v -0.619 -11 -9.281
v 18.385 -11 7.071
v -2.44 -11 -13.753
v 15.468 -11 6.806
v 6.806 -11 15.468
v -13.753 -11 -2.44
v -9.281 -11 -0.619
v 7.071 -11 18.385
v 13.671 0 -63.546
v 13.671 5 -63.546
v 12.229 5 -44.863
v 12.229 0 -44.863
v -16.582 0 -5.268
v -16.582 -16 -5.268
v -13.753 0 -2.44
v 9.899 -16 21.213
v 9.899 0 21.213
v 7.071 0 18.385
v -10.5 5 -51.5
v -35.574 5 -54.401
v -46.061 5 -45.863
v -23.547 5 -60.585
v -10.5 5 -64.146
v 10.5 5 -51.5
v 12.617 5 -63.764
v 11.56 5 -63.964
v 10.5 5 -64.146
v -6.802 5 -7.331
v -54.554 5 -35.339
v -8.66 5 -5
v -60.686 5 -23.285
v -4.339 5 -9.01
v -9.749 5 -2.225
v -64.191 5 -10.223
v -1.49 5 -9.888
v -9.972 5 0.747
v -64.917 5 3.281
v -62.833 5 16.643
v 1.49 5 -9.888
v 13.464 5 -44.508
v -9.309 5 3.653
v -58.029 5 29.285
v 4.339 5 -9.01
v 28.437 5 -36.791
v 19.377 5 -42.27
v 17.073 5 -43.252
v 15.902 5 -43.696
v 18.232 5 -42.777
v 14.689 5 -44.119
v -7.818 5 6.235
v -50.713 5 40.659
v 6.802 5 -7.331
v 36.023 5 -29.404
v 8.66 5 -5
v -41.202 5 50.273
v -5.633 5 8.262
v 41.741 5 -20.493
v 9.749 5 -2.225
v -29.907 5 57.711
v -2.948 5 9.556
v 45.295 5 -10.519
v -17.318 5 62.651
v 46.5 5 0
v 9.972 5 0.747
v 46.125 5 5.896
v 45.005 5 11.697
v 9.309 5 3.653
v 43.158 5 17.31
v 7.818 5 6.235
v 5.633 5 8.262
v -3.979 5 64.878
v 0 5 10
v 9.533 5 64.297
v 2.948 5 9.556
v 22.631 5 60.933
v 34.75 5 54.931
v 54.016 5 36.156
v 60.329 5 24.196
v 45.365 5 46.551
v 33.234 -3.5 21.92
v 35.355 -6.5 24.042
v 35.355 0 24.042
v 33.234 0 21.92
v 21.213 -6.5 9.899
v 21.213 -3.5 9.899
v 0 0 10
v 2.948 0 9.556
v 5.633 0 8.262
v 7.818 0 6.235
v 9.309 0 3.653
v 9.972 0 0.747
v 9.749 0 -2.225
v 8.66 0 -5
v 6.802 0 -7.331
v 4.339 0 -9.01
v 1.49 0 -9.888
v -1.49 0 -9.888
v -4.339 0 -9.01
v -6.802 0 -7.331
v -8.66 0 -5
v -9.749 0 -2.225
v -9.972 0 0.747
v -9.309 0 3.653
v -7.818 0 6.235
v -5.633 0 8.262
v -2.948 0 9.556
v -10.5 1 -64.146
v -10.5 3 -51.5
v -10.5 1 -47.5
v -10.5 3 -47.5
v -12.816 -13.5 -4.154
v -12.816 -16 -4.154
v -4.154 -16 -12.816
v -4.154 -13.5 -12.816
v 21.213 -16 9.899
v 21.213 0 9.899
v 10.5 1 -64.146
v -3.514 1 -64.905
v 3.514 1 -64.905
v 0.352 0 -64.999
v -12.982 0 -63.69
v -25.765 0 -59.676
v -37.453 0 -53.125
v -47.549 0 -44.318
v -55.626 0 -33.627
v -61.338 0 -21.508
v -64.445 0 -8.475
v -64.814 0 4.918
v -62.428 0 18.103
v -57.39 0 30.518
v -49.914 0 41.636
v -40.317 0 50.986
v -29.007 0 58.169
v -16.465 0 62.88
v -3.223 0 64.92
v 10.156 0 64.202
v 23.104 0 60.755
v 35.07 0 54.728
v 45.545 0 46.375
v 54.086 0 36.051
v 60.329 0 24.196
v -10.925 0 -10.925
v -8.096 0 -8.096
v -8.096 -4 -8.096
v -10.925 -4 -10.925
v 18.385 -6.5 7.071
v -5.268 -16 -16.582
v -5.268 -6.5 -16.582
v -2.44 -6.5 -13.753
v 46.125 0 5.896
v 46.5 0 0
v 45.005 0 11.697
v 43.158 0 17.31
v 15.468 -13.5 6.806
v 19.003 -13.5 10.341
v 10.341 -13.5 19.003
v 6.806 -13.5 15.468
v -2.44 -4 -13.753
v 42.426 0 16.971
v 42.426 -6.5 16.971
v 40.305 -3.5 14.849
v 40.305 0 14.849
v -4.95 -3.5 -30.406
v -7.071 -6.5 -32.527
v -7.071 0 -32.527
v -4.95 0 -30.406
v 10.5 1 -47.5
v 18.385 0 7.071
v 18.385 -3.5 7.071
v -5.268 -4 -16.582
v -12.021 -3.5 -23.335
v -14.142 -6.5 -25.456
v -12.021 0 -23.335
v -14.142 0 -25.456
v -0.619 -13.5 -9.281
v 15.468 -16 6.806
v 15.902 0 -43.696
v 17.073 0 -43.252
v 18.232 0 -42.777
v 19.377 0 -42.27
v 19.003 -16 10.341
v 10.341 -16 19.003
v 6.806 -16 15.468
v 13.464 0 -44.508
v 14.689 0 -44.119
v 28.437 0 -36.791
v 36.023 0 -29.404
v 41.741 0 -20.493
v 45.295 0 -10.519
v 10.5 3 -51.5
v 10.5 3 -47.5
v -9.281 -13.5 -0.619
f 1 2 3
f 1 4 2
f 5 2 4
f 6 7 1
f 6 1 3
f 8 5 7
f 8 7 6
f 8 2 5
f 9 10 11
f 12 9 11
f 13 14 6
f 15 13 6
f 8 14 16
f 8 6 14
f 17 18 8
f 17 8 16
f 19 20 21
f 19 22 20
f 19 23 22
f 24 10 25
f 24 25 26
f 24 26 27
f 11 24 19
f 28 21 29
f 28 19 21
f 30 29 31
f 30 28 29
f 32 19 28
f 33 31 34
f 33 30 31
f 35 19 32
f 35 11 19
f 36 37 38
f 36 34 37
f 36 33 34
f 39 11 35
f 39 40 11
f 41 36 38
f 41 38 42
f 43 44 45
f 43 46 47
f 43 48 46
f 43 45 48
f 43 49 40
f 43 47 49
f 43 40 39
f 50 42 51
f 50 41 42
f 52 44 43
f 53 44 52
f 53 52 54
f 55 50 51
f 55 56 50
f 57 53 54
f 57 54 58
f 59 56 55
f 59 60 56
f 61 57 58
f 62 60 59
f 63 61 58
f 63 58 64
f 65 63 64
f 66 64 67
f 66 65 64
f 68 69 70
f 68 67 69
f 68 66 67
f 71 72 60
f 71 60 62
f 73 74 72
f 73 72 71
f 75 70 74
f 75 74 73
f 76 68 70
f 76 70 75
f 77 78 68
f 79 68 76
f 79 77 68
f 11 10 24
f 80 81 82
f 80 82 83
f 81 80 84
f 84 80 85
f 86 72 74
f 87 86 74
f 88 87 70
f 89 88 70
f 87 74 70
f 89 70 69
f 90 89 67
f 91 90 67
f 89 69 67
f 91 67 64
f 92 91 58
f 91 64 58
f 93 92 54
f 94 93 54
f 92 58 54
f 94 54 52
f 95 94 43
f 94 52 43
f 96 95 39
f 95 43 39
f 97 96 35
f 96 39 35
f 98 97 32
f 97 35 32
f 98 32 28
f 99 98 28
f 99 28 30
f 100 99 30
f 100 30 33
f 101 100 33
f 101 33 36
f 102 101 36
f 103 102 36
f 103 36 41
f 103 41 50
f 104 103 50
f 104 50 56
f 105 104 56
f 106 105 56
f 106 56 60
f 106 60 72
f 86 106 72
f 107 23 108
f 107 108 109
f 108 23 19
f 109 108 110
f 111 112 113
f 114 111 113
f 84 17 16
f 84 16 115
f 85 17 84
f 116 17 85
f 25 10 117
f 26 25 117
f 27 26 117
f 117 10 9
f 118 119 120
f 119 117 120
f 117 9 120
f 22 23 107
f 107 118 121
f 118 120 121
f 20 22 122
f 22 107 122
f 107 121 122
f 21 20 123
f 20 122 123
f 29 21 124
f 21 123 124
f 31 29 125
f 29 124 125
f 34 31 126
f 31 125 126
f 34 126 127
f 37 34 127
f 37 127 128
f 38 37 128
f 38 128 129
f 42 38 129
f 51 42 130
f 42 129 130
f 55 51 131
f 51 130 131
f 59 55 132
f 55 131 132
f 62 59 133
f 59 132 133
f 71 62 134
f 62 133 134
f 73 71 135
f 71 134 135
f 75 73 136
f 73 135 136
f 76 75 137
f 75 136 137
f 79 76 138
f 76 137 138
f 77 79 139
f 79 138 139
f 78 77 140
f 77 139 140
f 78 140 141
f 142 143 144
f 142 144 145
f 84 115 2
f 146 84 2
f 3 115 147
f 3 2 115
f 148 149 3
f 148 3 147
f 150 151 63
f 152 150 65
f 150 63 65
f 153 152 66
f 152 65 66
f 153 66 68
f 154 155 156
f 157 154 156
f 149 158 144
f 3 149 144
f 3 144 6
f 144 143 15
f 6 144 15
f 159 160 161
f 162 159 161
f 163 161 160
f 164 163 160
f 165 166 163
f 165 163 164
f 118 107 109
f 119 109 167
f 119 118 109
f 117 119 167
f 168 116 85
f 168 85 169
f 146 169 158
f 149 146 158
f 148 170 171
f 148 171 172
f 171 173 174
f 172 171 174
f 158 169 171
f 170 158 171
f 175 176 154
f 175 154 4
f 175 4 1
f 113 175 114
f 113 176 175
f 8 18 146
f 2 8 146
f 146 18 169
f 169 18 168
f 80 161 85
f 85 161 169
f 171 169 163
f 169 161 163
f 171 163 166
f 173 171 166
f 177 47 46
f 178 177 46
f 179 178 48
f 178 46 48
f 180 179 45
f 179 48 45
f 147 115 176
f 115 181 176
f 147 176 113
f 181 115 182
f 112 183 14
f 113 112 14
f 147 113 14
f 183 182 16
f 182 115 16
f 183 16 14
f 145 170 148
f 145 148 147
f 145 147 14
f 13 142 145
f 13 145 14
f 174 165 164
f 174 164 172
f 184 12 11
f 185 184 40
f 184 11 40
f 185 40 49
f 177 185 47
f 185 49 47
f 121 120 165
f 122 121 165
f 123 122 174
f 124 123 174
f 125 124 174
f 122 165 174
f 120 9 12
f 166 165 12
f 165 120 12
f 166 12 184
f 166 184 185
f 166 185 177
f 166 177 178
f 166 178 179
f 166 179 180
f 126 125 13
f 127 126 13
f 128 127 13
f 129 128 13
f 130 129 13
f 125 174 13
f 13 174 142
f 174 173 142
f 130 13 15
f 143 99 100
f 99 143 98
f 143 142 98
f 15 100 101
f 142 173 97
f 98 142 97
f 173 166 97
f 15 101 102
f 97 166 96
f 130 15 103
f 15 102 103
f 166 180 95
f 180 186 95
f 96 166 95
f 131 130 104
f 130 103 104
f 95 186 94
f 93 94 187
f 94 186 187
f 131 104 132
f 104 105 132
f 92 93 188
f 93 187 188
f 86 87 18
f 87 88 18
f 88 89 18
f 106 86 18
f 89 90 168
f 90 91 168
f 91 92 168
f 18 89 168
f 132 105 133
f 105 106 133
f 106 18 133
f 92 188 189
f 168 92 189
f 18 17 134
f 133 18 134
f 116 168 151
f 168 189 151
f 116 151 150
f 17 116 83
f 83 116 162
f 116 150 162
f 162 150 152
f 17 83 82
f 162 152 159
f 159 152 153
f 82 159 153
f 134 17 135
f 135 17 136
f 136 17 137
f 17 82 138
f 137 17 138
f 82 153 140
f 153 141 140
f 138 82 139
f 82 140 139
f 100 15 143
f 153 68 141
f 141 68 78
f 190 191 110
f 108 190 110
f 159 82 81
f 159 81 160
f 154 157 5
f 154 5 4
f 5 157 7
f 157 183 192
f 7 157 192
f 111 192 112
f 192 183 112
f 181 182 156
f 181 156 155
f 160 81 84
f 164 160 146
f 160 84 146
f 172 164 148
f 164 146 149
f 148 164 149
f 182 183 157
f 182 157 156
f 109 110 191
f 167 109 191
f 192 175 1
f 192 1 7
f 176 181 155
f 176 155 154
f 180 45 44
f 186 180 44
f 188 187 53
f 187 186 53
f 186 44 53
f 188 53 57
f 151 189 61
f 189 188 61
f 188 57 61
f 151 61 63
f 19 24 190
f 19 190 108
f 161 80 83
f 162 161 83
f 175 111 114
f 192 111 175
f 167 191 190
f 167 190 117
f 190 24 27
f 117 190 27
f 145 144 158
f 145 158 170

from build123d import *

# Parameters (mm, degrees)
SKETCH1_R           = 65
BOSS_EXTRUDE1_DEPTH = 5
SKETCH2_R           = 10
CUT_EXTRUDE1_DEPTH  = 5
CUT_EXTRUDE3_DEPTH  = 4
CUT_EXTRUDE2_DEPTH  = 93.059763198
BOSS_EXTRUDE2_DEPTH = 11
BOSS_EXTRUDE3_DEPTH = 5
CUT_EXTRUDE4_DEPTH  = 5
CUT_EXTRUDE5_DEPTH  = 2.5
SKETCH16_W          = 21
SKETCH16_H          = 2
BOSS_EXTRUDE5_DEPTH = 4
SKETCH17_W          = 4
SKETCH17_H          = 4
CUT_EXTRUDE8_DEPTH  = 8
BOSS_EXTRUDE6_DEPTH = 6.5
SKETCH23_W          = 64
SKETCH23_H          = 3.5
CUT_EXTRUDE9_DEPTH  = 10


with BuildPart() as part:
    # Sketch1 → Boss-Extrude1 (new body)
    with BuildSketch(Plane(origin=(0, 0, 0), x_dir=(1, 0, 0), z_dir=(0, 1, 0))):
        with Locations(Location((0, 0, 0), (0, 0, 270))):
            Circle(SKETCH1_R)
    extrude(amount=BOSS_EXTRUDE1_DEPTH)

    # Sketch2 → Cut-Extrude1 (cut)
    with BuildSketch(Plane(origin=(0, 5, 0), x_dir=(1, 0, 0), z_dir=(0, 1, 0))):
        with Locations(Location((0, 0, 0), (0, 0, 270))):
            Circle(SKETCH2_R)
    extrude(amount=-CUT_EXTRUDE1_DEPTH, mode=Mode.SUBTRACT)

    # Sketch5 → Cut-Extrude3 (cut)
    with BuildSketch(Plane(origin=(0, 5, 0), x_dir=(1, 0, 0), z_dir=(0, 1, 0))):
        Polygon((0, 47.5), (10.5, 47.5), (10.5, 65), (-10.5, 65), (-10.5, 47.5), align=None)
    extrude(amount=-CUT_EXTRUDE3_DEPTH, mode=Mode.SUBTRACT)

    # Sketch3 → Cut-Extrude2 (cut, through all)
    with BuildSketch(Plane(origin=(0, 5, 0), x_dir=(1, 0, 0), z_dir=(0, 1, 0))):
        with BuildLine():
            Line((43.158190089, -17.309553092), (60.328652813, -24.196149483))
            ThreePointArc((60.328652813, -24.196149483), (63.821479272, -12.321476518), (65, 0))
            ThreePointArc((65, 0), (54.706549574, 35.102612918), (27.086355887, 59.087471809))
            ThreePointArc((27.086355887, 59.087471809), (24.677873317, 60.133206871), (22.229121422, 61.080816635))
            ThreePointArc((22.229121422, 61.080816635), (17.992417486, 62.460170613), (13.671171428, 63.546038994))
            Line((13.671171428, 63.546038994), (12.228525973, 44.863271755))
            ThreePointArc((12.228525973, 44.863271755), (14.077546566, 44.317859636), (15.902371478, 43.696276516))
            ThreePointArc((15.902371478, 43.696276516), (17.654170911, 43.018371069), (19.377162288, 42.270268294))
            ThreePointArc((19.377162288, 42.270268294), (39.136223926, 25.111869241), (46.5, 0))
            ThreePointArc((46.5, 0), (45.656904402, -8.81459474), (43.158190089, -17.309553092))
        make_face()
    extrude(amount=-CUT_EXTRUDE2_DEPTH, mode=Mode.SUBTRACT)

    # Sketch9 → Boss-Extrude2 (add)
    with BuildSketch(Plane.XZ):
        Polygon((-13.753226894, -2.439518395), (-16.581654019, -5.26794552), (-5.26794552, -16.581654019), (-2.439518395, -13.753226894), align=None)
        Polygon((9.899494937, 21.213203436), (7.071067812, 18.384776311), (18.384776311, 7.071067812), (21.213203436, 9.899494937), align=None)
    extrude(amount=BOSS_EXTRUDE2_DEPTH)

    # Sketch10 → Boss-Extrude3 (add)
    with BuildSketch(Plane.XZ.offset(11)):
        Polygon((-5.26794552, -16.581654019), (-16.581654019, -5.26794552), (9.899494937, 21.213203436), (21.213203436, 9.899494937), align=None)
    extrude(amount=BOSS_EXTRUDE3_DEPTH)

    # Sketch11 → Cut-Extrude4 (cut)
    with BuildSketch(Plane.XZ.offset(16)):
        Polygon((6.805902769, 15.467960838), (15.467960838, 6.805902769), (-0.618718434, -9.280776503), (-9.280776503, -0.618718434), align=None)
    extrude(amount=-CUT_EXTRUDE4_DEPTH, mode=Mode.SUBTRACT)

    # Sketch12 → Cut-Extrude5 (cut)
    with BuildSketch(Plane.XZ.offset(16)):
        Polygon((-4.154251265, -12.816309334), (-0.618718434, -9.280776503), (-9.280776503, -0.618718434), (-12.816309334, -4.154251265), align=None)
        Polygon((6.805902769, 15.467960838), (10.3414356, 19.00349367), (19.00349367, 10.3414356), (15.467960838, 6.805902769), align=None)
    extrude(amount=-CUT_EXTRUDE5_DEPTH, mode=Mode.SUBTRACT)

    # Sketch16 → Boss-Extrude5 (add)
    with BuildSketch(Plane(origin=(0, 0, -47.5), x_dir=(-1, 0, 0), z_dir=(0, 0, -1))):
        with Locations((0, 4)):
            Rectangle(SKETCH16_W, SKETCH16_H)
    extrude(amount=BOSS_EXTRUDE5_DEPTH)

    # Sketch17 → Cut-Extrude8 (cut)
    with BuildSketch(Plane(origin=(5.656854249, 0, -5.656854249), x_dir=(-0.7071067811865472, 0, -0.7071067811865479), z_dir=(0.7071067811865479, 0, -0.7071067811865472))):
        with Locations((13.45, -2)):
            Rectangle(SKETCH17_W, SKETCH17_H)
    extrude(amount=-CUT_EXTRUDE8_DEPTH, mode=Mode.SUBTRACT)

    # Sketch22 → Boss-Extrude6 (add)
    with BuildSketch(Plane.XZ):
        Polygon((21.213203436, 9.899494937), (35.355339059, 24.04163056), (42.426406871, 16.970562748), (-7.071067812, -32.526911935), (-14.142135624, -25.455844123), align=None)
    extrude(amount=BOSS_EXTRUDE6_DEPTH)

    # Sketch23 → Cut-Extrude9 (cut)
    with BuildSketch(Plane(origin=(12.727922061, 0, -12.727922061), x_dir=(-0.7071067811865476, 0, -0.7071067811865476), z_dir=(0.7071067811865476, 0, -0.7071067811865476))):
        with Locations((-7, -1.75)):
            Rectangle(SKETCH23_W, SKETCH23_H)
    extrude(amount=-CUT_EXTRUDE9_DEPTH, mode=Mode.SUBTRACT)


solid = part.part
